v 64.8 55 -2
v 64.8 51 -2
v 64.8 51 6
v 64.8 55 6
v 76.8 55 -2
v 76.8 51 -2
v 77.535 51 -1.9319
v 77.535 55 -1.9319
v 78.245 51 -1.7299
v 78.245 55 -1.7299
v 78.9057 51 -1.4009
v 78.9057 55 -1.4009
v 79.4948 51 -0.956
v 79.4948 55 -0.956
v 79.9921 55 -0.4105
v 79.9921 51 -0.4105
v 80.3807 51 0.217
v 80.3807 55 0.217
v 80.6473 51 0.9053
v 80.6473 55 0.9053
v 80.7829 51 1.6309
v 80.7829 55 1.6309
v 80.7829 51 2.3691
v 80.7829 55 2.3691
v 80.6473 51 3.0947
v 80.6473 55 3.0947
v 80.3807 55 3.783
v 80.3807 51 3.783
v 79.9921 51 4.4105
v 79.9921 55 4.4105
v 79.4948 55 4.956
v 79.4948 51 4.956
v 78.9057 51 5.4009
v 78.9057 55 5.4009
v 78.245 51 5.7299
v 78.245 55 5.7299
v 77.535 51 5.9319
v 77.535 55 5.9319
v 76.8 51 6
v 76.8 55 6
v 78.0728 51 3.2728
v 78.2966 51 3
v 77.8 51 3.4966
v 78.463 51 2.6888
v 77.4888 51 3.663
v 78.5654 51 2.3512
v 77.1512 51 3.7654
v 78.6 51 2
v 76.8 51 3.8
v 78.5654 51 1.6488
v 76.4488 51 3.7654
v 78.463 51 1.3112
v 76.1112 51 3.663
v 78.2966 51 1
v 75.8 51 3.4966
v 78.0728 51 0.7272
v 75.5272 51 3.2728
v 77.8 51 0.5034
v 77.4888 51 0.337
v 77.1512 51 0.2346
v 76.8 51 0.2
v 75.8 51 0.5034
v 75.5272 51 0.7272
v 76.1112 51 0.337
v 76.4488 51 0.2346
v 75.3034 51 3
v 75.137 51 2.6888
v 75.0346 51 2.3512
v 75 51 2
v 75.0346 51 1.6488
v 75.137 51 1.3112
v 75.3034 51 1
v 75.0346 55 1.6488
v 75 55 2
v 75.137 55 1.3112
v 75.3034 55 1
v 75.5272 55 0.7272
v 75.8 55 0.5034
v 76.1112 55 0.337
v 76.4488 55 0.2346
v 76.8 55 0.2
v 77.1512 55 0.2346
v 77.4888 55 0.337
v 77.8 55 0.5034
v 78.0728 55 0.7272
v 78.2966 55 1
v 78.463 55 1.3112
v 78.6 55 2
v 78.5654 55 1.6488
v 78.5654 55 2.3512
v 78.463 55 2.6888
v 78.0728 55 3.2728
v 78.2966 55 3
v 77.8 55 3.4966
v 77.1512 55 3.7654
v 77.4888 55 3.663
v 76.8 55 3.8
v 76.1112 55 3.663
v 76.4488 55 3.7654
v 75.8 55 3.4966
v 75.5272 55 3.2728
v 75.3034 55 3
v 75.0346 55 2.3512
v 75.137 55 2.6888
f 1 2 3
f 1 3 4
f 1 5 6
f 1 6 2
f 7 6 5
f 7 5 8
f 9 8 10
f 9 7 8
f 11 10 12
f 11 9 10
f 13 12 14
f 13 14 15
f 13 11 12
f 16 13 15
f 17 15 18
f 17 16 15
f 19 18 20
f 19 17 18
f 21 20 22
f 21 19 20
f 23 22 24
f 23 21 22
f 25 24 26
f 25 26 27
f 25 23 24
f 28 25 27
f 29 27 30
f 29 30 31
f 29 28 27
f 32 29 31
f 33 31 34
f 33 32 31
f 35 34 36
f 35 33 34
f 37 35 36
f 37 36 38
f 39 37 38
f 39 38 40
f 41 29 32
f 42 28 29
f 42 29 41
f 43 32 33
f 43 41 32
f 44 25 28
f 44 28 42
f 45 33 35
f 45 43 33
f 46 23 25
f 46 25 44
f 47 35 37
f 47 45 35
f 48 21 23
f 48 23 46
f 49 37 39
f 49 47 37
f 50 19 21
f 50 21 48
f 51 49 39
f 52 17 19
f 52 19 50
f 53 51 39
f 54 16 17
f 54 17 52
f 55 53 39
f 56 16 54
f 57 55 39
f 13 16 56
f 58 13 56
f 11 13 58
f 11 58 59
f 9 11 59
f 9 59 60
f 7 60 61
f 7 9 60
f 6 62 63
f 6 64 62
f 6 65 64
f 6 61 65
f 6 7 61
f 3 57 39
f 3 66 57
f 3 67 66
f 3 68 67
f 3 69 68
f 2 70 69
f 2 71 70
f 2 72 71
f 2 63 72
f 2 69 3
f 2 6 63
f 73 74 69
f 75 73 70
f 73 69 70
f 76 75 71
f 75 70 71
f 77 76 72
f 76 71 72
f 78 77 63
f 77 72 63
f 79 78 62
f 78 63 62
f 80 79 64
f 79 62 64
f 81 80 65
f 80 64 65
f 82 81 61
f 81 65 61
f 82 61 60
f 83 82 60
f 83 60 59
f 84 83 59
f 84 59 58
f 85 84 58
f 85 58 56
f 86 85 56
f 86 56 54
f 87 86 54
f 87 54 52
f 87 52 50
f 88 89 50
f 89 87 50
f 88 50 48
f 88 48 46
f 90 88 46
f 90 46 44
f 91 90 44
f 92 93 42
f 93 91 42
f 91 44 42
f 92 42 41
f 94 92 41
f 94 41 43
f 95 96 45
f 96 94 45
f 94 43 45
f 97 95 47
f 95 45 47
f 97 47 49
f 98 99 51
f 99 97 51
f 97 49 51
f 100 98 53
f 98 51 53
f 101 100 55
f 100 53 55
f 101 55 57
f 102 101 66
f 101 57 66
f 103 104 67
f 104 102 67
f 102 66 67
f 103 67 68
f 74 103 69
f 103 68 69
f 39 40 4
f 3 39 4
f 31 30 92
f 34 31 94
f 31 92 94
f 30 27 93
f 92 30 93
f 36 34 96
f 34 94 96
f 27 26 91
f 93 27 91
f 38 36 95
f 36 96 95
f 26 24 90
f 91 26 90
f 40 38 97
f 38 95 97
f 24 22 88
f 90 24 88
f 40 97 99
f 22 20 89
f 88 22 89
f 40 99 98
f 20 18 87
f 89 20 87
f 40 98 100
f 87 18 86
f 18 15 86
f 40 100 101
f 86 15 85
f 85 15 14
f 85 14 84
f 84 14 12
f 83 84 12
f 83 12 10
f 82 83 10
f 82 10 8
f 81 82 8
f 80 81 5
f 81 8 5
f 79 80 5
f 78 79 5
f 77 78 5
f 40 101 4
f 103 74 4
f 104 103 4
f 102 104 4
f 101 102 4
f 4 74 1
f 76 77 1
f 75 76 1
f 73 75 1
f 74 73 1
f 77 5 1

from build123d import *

# Parameters (mm, degrees)
CYLINDER001_R     = 1.8
CYLINDER001_DEPTH = 30
CYLINDER_R        = 4
CYLINDER_DEPTH    = 4
BOX008_W          = 12
BOX008_H          = 4
BOX008_DEPTH      = 8


with BuildPart() as cylinder001:
    # Cylinder001 → Cylinder001 (new body)
    with BuildSketch(Plane(origin=(0, 0, 4), x_dir=(1, 0, 0), z_dir=(0, 1, 0))):
        Circle(CYLINDER001_R)
    extrude(amount=CYLINDER001_DEPTH)


with BuildPart() as cylinder:
    # Cylinder → Cylinder (new body)
    with BuildSketch(Plane(origin=(0, 0, 4), x_dir=(1, 0, 0), z_dir=(0, 1, 0))):
        Circle(CYLINDER_R)
    extrude(amount=CYLINDER_DEPTH)


with BuildPart() as ear:
    # Box008 → Box008 (new body)
    with BuildSketch(Plane.XY):
        with Locations((6, 2)):
            Rectangle(BOX008_W, BOX008_H)
    extrude(amount=BOX008_DEPTH)

    # Fusion: union Cylinder
    add(cylinder.part)

    # Cut: cut Cylinder001
    add(cylinder001.part, mode=Mode.SUBTRACT)


with BuildPart() as ear_1:
    # Cut placement: moved
    add(ear.part.moved(Location((-12, 51, -2))))


with BuildPart() as part_mirroring:
    # Part__Mirroring: instance of ear
    add(ear_1.part.mirror(Plane(origin=(32.4, 0, 0), x_dir=(0, -1, 0), z_dir=(1, 0, 0))))


solid = part_mirroring.part
